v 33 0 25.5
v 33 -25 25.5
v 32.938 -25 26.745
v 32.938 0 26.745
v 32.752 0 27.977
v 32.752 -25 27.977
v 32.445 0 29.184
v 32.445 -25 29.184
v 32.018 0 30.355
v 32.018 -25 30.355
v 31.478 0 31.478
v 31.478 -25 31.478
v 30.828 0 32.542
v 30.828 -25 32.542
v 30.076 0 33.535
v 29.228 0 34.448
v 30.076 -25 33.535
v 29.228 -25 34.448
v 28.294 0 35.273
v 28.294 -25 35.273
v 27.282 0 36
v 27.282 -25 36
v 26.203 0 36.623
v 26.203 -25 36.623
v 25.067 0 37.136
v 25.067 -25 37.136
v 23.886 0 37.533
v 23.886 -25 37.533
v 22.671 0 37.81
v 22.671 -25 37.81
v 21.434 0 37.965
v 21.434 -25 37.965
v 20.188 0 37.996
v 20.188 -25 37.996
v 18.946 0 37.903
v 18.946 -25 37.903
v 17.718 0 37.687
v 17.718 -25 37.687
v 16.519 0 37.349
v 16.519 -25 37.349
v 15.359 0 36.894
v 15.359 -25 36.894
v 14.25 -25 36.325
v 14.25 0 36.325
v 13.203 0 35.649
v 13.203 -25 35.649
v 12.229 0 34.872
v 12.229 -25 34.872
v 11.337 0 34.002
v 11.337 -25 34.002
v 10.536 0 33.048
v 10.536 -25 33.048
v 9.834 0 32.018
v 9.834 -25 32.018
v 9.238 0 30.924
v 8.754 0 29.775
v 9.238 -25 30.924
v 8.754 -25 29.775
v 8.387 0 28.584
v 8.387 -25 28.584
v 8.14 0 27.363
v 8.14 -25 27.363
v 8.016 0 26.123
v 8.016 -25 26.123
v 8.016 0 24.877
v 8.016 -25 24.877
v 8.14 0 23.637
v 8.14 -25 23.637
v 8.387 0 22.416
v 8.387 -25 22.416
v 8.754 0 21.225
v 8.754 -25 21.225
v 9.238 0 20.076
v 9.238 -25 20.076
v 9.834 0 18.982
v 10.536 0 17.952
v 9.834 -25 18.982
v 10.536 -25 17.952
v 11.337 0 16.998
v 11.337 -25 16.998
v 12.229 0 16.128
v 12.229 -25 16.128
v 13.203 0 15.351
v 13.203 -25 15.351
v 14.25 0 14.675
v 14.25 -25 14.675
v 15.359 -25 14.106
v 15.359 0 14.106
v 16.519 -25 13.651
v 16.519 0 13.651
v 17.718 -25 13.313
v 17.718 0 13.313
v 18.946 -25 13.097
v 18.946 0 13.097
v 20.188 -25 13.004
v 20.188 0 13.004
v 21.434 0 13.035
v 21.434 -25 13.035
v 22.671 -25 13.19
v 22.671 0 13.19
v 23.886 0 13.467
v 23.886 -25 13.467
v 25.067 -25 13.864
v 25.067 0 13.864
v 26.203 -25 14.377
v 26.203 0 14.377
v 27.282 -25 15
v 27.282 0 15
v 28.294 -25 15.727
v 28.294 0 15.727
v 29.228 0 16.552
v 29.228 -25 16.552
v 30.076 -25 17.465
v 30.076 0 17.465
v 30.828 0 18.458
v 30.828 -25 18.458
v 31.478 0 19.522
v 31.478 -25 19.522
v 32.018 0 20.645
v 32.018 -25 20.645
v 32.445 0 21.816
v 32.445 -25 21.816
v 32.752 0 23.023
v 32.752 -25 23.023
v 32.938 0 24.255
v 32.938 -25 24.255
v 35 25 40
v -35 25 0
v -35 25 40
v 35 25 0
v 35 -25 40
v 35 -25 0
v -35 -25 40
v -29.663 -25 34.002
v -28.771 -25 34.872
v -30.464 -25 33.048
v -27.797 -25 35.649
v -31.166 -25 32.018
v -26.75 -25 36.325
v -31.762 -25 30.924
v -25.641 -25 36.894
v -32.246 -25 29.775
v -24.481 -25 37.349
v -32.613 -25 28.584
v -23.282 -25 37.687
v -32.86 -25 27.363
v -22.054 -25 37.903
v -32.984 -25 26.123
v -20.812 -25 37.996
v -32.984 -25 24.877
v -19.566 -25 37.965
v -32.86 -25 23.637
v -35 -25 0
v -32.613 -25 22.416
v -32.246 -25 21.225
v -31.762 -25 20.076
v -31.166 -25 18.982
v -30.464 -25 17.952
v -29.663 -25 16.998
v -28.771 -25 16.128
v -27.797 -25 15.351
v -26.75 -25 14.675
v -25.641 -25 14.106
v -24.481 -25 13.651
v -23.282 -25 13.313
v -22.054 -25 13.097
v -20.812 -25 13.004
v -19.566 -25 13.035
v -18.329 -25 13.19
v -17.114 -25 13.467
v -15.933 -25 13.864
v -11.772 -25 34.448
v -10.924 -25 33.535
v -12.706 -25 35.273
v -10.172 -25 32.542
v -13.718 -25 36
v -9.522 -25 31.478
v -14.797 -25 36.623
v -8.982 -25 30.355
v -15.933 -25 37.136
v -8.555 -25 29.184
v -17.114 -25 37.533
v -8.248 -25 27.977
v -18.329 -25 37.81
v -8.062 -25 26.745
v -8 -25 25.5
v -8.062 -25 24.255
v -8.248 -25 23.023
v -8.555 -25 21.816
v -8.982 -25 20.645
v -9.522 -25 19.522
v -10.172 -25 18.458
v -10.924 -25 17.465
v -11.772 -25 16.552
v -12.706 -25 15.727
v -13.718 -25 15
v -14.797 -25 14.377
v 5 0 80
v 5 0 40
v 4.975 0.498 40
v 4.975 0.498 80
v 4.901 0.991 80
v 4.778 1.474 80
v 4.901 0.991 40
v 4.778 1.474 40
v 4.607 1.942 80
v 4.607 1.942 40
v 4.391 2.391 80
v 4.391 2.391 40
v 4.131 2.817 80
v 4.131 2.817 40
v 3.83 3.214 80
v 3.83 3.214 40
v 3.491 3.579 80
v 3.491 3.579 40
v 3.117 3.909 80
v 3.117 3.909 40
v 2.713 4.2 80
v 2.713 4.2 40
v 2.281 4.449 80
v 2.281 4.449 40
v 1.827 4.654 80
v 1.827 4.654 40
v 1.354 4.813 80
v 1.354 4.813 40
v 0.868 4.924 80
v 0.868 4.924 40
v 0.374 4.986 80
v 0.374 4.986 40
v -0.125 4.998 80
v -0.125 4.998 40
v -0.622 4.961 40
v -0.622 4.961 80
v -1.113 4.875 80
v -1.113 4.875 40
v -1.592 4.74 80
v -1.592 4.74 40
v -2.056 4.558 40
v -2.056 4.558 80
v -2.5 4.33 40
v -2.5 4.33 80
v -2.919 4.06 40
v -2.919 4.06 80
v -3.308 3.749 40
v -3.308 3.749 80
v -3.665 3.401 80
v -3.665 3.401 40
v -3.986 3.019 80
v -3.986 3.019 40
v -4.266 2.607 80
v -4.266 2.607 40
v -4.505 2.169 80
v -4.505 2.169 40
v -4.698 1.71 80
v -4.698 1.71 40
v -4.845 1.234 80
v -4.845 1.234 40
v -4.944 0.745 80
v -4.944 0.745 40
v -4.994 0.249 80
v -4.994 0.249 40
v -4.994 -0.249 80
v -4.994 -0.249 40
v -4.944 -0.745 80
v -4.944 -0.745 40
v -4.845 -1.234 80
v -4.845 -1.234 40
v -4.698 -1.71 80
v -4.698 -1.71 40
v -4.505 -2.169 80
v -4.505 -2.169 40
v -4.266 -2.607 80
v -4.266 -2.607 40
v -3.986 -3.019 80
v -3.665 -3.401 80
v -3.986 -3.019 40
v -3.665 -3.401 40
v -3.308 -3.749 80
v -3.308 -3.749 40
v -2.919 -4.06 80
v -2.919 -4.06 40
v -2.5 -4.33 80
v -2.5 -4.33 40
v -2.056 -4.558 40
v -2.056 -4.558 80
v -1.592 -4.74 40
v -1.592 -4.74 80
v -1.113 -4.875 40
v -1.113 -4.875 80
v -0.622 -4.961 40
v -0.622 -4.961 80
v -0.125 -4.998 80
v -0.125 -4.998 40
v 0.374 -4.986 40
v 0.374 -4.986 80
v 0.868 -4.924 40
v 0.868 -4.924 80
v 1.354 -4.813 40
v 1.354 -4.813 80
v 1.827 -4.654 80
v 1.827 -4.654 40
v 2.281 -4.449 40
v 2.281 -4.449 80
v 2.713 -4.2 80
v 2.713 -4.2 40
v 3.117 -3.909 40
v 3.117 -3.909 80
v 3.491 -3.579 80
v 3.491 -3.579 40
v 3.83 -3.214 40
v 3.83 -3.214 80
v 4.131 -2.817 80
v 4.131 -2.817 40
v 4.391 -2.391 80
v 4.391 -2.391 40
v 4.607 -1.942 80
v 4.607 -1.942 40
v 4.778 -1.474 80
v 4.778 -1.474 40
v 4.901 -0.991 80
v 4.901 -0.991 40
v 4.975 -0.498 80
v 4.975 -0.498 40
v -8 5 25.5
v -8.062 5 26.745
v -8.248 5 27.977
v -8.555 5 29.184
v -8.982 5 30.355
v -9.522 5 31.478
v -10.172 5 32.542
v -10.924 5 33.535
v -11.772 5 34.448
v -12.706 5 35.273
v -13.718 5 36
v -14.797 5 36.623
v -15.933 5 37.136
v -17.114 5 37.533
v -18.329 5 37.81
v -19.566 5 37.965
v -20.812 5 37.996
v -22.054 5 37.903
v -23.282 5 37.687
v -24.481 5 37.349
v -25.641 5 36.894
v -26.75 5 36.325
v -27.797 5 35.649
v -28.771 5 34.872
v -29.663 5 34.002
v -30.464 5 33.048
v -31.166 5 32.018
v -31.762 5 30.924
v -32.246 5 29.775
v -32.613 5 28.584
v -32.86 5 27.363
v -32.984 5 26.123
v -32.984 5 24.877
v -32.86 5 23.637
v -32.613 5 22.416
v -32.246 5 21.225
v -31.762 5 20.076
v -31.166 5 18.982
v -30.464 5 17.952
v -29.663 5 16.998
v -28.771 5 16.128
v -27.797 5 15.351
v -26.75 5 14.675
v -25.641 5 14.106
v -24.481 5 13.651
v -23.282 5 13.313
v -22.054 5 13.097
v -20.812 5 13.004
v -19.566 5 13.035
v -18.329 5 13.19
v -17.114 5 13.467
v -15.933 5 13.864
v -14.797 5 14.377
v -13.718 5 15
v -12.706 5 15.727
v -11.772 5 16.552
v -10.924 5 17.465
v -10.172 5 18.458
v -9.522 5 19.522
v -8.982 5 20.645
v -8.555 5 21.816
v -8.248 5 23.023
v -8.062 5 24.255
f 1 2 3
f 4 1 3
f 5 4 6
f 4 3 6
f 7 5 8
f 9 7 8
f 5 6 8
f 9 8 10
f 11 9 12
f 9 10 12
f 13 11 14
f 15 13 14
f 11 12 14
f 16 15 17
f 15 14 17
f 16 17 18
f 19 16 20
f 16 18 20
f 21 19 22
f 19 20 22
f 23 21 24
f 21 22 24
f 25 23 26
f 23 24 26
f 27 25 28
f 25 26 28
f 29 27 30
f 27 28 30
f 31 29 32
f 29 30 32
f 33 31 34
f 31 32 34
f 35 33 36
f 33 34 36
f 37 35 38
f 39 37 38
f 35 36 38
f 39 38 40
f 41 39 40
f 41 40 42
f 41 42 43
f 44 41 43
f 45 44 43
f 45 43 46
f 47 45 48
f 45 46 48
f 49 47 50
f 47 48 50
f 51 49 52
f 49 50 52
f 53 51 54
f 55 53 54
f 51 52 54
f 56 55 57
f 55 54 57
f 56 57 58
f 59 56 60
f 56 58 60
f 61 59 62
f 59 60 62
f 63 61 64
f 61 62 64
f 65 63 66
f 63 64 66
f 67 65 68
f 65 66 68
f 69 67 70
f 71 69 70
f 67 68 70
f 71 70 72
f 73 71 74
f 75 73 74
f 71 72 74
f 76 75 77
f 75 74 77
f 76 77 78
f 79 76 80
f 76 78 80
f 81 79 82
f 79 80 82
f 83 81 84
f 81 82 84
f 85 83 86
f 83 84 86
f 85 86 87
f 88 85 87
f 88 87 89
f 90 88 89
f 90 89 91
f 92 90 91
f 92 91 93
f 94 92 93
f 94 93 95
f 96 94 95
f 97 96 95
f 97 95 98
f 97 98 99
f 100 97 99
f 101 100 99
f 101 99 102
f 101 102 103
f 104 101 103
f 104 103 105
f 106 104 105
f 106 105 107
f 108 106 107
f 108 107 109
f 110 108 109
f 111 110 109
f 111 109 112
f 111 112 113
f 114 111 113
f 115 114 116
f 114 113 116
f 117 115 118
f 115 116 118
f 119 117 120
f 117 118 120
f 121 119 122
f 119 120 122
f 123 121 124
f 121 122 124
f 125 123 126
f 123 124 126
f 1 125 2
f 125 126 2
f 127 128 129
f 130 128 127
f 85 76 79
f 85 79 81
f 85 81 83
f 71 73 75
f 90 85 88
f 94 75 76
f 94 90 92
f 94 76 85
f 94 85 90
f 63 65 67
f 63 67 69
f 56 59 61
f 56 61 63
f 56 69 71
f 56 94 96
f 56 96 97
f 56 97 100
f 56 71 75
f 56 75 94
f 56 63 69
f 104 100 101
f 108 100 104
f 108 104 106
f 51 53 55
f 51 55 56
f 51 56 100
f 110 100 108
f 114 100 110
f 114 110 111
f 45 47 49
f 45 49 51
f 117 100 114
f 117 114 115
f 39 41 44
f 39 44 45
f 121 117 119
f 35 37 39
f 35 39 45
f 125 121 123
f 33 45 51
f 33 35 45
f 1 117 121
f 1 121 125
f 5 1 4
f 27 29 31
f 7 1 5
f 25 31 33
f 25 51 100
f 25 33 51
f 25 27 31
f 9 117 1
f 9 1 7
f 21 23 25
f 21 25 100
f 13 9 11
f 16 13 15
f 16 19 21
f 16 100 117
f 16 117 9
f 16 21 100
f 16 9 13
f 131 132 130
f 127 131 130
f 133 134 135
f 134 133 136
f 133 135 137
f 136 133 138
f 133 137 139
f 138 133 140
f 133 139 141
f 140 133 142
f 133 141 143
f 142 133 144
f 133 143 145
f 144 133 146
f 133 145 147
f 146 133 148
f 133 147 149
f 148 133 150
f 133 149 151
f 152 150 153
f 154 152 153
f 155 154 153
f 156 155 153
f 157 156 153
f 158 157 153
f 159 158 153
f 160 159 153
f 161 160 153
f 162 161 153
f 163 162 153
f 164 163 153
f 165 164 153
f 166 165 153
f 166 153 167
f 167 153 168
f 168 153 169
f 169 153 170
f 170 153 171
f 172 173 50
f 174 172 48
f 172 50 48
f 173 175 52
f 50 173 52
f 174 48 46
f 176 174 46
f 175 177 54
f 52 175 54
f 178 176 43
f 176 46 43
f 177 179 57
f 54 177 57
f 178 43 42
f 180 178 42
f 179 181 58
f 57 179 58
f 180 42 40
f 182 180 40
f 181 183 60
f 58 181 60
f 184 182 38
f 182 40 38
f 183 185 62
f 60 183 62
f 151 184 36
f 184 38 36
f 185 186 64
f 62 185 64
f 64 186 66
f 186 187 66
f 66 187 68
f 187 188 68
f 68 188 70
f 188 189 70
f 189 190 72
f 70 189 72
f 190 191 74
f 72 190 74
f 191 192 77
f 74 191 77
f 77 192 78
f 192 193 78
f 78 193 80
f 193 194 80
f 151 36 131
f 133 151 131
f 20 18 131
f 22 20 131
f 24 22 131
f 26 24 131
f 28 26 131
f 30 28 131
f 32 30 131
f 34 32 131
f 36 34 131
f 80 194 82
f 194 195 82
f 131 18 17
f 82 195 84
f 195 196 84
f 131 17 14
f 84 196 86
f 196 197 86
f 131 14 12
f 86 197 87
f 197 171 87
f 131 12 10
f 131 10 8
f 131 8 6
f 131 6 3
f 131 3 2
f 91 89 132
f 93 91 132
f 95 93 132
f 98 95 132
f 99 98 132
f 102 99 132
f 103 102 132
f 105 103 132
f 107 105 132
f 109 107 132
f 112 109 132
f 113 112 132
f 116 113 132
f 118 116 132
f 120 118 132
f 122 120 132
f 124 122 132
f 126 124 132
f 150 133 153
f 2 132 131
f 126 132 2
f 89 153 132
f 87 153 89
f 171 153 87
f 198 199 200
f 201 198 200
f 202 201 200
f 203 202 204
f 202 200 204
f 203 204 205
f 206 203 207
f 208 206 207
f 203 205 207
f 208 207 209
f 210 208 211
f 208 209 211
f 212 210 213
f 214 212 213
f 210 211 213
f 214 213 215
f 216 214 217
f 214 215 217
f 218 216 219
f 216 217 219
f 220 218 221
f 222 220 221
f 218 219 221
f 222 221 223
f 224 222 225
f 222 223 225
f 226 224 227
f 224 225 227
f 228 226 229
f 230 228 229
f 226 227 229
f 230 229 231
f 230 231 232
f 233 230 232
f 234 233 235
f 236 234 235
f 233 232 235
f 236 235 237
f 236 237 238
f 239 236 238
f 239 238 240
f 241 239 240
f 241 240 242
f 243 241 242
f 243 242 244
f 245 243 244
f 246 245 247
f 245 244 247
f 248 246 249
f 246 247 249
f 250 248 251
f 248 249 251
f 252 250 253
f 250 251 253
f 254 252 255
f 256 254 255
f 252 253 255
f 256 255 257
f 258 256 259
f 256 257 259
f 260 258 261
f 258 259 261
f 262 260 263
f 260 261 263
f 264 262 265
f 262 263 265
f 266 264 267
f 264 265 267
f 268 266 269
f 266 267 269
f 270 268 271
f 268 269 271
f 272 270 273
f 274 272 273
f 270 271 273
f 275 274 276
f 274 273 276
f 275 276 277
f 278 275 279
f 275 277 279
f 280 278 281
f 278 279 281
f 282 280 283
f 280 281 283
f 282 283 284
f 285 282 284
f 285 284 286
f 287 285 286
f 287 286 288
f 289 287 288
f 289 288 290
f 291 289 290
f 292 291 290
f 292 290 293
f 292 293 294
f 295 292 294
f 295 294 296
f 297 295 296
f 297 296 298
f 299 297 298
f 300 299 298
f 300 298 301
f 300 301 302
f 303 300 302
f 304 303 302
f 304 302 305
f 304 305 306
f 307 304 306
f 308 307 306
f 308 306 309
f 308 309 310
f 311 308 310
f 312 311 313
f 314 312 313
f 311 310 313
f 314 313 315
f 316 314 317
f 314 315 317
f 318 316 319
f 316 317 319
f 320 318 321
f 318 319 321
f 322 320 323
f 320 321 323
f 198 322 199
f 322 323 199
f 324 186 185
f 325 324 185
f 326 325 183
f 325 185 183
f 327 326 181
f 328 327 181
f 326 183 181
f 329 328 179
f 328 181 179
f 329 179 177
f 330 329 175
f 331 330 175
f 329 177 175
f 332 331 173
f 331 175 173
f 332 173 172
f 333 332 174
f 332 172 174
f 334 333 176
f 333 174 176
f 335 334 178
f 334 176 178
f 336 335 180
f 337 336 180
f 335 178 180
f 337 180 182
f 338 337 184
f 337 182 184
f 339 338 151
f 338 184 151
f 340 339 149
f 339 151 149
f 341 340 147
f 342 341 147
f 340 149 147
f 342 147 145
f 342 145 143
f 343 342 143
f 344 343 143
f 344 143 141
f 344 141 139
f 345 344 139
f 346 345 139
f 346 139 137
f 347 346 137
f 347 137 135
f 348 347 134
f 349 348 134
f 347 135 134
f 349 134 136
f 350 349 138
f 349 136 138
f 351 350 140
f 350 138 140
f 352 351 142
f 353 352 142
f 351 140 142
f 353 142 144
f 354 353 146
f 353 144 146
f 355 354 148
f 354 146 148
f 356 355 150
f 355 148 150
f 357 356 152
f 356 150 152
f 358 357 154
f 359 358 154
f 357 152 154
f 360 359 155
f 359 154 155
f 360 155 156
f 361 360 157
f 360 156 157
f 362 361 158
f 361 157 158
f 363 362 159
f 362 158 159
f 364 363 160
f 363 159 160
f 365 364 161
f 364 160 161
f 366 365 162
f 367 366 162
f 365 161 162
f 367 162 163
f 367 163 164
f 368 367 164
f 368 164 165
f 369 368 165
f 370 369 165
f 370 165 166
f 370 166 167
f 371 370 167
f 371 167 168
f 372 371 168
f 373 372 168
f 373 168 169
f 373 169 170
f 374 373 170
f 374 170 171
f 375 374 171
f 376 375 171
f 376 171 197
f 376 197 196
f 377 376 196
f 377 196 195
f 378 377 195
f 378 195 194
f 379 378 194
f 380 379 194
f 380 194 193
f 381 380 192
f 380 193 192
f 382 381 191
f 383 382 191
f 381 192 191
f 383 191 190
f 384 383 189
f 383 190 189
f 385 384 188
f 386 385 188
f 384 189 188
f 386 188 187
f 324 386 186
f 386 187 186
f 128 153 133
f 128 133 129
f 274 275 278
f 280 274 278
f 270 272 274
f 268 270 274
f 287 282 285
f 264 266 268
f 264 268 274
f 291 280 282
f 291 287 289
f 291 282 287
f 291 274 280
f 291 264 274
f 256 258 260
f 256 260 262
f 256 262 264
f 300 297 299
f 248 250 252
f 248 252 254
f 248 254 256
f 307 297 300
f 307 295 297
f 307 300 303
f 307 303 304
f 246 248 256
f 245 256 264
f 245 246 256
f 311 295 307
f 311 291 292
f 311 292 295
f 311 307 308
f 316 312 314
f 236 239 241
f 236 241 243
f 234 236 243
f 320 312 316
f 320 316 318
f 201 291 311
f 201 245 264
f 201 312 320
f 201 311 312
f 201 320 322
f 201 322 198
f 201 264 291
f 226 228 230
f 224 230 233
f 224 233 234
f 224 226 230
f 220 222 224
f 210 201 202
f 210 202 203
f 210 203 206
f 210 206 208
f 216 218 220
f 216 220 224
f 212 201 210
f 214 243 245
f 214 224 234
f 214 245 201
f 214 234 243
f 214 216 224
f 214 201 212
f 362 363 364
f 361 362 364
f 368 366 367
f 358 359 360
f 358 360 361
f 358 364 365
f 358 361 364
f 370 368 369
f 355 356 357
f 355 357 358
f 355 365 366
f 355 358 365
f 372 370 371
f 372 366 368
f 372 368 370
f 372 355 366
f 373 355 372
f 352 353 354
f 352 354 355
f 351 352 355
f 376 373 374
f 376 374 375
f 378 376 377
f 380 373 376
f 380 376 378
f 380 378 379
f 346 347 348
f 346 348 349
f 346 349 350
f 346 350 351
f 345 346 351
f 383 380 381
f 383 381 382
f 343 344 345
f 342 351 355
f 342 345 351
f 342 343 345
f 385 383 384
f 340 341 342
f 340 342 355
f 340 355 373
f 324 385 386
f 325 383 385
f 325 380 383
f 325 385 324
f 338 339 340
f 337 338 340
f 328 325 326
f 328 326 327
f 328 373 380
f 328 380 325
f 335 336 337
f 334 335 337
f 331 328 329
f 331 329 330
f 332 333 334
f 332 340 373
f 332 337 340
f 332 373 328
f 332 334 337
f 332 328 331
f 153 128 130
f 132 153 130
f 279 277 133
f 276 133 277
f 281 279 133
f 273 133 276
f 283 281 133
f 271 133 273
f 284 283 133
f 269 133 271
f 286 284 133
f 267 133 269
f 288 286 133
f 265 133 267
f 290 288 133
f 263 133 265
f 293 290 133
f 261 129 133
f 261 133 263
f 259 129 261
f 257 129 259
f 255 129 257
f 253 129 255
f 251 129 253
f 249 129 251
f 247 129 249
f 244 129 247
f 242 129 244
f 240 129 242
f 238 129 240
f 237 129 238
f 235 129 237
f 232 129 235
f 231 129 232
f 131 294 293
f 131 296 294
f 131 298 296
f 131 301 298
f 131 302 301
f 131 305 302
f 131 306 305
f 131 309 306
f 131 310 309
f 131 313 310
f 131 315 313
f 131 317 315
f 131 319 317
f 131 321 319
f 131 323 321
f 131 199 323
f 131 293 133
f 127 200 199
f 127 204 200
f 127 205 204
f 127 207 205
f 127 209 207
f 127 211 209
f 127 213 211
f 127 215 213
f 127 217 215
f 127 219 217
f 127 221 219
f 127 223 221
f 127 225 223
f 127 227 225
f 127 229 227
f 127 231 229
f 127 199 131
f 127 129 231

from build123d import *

# Parameters (mm, degrees)
F0_W     = 70
F0_H     = 50
F1_DEPTH = 40
F2_R     = 5
F3_DEPTH = 40
F4_R     = 12.5
F5_DEPTH = 30
F6_R     = 12.5
F7_DEPTH = 25


with BuildPart() as f1:
    # F0 (on Top) → F1 (new body)
    with BuildSketch(Plane.XY):
        Rectangle(F0_W, F0_H)
    extrude(amount=F1_DEPTH)

    # F2 (on face) → F3 (join)
    with BuildSketch(Plane.XY.offset(40)):
        Circle(F2_R)
    extrude(amount=F3_DEPTH)

    # F4 (on face) → F5 (cut)
    with BuildSketch(Plane.XZ.offset(25)):
        with Locations((-20.5, 25.5)):
            Circle(F4_R)
    extrude(amount=-F5_DEPTH, mode=Mode.SUBTRACT)

    # F6 (on face) → F7 (cut)
    with BuildSketch(Plane.XZ.offset(25)):
        with Locations((20.5, 25.5)):
            Circle(F6_R)
    extrude(amount=-F7_DEPTH, mode=Mode.SUBTRACT)


solid = f1.part
